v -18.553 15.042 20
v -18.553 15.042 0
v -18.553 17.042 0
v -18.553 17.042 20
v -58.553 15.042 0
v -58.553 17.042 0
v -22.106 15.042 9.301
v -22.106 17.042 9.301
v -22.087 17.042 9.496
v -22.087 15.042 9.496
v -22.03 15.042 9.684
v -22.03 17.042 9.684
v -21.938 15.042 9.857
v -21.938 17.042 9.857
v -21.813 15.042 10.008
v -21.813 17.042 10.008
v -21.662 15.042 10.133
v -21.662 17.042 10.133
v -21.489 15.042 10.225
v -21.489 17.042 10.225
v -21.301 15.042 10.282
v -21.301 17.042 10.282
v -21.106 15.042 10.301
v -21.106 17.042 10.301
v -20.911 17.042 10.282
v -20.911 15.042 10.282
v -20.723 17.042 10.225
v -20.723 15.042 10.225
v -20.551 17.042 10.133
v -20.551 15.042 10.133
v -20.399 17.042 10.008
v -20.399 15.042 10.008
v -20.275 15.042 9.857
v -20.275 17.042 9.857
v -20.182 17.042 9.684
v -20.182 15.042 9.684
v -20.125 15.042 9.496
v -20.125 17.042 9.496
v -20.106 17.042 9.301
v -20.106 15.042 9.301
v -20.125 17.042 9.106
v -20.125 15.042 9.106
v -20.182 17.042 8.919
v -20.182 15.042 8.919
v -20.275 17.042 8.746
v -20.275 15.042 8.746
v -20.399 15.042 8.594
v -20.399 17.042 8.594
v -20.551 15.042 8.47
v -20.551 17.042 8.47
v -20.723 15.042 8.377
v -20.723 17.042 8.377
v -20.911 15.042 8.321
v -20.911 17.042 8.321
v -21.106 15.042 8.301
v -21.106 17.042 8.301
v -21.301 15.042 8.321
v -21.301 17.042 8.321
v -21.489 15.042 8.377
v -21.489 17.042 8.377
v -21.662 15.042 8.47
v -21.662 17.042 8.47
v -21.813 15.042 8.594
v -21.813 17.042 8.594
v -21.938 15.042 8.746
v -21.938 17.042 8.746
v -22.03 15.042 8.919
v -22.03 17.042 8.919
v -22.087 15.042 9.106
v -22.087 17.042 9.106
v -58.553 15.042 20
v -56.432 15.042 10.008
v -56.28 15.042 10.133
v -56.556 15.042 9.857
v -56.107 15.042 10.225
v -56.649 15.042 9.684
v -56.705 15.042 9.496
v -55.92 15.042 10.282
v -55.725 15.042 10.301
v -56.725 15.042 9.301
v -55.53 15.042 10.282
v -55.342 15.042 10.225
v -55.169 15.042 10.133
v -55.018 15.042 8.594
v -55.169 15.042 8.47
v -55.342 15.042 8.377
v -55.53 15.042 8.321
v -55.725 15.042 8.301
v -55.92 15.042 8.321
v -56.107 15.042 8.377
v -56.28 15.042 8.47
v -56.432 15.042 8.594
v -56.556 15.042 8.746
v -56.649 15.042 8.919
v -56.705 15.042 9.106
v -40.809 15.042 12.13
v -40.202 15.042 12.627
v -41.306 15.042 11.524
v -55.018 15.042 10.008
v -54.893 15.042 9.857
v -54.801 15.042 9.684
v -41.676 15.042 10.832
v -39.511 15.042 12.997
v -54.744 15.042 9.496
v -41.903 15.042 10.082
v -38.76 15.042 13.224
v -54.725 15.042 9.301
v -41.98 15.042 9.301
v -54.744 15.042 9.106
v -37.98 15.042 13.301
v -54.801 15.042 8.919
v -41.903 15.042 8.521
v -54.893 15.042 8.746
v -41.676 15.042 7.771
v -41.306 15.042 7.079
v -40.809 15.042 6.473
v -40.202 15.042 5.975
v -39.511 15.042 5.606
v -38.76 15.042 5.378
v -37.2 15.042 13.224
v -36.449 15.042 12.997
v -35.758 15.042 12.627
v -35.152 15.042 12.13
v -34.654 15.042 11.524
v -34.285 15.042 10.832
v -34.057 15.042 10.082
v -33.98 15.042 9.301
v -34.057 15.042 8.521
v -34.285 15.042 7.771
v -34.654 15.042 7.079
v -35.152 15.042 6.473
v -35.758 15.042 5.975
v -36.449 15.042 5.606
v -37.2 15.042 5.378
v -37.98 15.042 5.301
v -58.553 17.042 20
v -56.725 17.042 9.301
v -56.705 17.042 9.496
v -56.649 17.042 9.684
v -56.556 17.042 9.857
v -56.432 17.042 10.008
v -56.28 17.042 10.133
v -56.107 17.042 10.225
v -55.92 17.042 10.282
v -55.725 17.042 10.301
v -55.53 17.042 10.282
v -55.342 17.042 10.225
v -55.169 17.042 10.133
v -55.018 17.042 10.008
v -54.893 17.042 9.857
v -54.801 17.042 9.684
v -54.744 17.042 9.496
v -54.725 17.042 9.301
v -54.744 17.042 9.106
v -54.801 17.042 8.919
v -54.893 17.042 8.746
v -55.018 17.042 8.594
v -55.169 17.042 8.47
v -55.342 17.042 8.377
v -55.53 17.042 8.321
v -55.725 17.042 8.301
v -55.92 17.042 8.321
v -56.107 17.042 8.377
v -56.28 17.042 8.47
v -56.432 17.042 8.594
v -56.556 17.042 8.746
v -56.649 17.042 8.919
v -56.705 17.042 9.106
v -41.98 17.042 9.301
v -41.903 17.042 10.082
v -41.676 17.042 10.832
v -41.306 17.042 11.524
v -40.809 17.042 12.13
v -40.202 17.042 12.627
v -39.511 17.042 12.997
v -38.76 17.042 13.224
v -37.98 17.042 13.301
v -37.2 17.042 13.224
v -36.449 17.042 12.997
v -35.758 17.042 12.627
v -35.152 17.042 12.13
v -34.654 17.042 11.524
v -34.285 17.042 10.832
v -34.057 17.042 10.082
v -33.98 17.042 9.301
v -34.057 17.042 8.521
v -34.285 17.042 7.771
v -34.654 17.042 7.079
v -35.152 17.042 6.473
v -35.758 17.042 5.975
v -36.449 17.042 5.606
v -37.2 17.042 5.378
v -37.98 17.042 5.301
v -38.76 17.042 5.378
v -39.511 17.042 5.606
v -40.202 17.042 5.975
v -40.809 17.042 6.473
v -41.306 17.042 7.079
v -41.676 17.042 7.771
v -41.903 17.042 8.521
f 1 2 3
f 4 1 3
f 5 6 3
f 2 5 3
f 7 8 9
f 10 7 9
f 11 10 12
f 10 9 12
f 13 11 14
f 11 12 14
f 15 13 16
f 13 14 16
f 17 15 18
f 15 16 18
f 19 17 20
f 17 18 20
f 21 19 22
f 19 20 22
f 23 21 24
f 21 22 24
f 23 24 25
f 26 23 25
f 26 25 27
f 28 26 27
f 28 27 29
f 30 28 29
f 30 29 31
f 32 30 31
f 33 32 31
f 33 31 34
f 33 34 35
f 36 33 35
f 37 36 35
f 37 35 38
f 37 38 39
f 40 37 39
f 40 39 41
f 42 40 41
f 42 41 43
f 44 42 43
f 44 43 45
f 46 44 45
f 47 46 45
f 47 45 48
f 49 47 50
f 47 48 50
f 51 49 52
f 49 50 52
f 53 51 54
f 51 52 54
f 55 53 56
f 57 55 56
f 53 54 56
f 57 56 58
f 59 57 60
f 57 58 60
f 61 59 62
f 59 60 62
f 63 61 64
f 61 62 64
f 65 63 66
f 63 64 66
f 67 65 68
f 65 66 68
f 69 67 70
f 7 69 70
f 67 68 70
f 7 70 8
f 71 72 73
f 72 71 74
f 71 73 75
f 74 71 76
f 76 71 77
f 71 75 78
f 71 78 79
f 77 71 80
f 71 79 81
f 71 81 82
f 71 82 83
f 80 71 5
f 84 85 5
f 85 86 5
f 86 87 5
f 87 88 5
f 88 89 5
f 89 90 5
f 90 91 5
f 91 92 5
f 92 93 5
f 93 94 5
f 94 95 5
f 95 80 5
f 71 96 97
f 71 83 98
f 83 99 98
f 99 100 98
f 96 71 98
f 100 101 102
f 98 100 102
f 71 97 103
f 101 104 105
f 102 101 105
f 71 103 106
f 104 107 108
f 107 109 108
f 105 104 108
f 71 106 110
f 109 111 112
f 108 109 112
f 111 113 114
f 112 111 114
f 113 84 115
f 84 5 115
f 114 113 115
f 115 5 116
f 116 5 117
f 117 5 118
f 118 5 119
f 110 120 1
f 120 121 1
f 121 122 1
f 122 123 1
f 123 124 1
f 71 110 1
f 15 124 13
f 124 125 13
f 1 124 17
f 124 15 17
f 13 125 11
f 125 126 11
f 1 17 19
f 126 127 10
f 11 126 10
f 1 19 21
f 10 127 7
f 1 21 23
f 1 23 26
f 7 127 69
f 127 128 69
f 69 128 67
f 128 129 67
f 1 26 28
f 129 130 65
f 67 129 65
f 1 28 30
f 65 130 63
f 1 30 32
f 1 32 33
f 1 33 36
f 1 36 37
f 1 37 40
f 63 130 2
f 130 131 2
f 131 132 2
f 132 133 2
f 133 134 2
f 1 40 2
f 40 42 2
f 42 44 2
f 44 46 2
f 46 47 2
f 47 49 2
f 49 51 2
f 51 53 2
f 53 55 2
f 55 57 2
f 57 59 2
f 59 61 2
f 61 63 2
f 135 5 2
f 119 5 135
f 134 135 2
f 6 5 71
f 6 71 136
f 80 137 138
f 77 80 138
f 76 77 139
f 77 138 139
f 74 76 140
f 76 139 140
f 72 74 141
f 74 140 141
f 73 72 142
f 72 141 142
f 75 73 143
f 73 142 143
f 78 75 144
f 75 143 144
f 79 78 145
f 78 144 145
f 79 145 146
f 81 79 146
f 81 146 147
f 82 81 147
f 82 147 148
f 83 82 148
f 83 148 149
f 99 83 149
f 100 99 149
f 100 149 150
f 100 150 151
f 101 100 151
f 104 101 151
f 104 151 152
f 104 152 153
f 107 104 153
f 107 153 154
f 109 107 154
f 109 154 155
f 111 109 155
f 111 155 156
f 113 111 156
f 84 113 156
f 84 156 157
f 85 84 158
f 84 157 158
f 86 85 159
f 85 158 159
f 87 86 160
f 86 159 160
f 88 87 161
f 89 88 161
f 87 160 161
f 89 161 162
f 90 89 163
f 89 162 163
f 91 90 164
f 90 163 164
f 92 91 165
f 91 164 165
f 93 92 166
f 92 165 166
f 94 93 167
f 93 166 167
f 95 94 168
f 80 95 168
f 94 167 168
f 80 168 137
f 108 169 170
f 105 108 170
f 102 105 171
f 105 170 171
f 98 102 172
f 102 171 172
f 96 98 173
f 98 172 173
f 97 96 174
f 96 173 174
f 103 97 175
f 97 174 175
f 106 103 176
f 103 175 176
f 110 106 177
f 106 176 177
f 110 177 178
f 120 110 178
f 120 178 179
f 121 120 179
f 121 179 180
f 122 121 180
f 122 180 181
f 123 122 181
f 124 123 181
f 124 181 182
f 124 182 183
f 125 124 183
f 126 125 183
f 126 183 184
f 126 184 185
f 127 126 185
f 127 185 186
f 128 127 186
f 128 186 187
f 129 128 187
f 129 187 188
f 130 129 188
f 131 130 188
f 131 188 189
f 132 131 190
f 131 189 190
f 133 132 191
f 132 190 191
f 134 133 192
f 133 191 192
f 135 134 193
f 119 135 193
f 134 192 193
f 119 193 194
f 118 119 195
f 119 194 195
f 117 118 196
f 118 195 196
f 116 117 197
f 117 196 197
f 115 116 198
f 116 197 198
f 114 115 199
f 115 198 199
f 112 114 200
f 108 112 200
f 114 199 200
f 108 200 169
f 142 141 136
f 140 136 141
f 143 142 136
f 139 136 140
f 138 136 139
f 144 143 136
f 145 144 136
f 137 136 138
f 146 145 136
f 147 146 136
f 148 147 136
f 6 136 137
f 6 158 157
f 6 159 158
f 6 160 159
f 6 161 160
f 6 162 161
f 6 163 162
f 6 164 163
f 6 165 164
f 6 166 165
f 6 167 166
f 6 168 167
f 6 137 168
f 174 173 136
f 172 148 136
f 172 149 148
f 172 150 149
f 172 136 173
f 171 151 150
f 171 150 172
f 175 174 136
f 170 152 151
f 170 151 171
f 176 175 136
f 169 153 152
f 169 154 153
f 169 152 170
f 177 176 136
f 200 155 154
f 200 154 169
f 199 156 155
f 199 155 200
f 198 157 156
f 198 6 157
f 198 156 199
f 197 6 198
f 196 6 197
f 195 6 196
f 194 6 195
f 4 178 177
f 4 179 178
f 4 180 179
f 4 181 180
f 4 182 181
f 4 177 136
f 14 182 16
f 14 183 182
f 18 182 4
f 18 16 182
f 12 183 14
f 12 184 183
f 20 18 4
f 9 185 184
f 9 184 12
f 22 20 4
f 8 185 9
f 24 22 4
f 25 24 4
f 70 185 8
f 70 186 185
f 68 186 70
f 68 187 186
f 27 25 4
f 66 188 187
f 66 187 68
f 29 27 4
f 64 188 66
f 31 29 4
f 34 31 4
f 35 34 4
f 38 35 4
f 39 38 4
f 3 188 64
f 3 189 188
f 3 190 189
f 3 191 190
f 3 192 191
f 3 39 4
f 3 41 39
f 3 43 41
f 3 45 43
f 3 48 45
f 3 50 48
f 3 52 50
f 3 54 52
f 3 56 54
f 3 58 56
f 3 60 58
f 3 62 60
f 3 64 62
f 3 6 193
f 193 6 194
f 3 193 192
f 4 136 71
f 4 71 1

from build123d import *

# Parameters (mm, degrees)
F0_W     = 40
F0_H     = 2
F1_DEPTH = 20
F4_D     = 8
F5_D     = 2


with BuildPart() as f1:
    # F0 (on Top) → F1 (new body)
    with BuildSketch(Plane.XY):
        with Locations((-38.553373, 16.042135)):
            Rectangle(F0_W, F0_H)
    extrude(amount=F1_DEPTH)

    # F4 (through all)
    with Locations(Plane.XZ):
        with Locations((-37.980106, 9.301319)):
            Hole(F4_D / 2)

    # F5 (through all)
    with Locations(Plane.XZ):
        with Locations((-55.724628, 9.301319), (-21.106074, 9.301319)):
            Hole(F5_D / 2)


solid = f1.part
